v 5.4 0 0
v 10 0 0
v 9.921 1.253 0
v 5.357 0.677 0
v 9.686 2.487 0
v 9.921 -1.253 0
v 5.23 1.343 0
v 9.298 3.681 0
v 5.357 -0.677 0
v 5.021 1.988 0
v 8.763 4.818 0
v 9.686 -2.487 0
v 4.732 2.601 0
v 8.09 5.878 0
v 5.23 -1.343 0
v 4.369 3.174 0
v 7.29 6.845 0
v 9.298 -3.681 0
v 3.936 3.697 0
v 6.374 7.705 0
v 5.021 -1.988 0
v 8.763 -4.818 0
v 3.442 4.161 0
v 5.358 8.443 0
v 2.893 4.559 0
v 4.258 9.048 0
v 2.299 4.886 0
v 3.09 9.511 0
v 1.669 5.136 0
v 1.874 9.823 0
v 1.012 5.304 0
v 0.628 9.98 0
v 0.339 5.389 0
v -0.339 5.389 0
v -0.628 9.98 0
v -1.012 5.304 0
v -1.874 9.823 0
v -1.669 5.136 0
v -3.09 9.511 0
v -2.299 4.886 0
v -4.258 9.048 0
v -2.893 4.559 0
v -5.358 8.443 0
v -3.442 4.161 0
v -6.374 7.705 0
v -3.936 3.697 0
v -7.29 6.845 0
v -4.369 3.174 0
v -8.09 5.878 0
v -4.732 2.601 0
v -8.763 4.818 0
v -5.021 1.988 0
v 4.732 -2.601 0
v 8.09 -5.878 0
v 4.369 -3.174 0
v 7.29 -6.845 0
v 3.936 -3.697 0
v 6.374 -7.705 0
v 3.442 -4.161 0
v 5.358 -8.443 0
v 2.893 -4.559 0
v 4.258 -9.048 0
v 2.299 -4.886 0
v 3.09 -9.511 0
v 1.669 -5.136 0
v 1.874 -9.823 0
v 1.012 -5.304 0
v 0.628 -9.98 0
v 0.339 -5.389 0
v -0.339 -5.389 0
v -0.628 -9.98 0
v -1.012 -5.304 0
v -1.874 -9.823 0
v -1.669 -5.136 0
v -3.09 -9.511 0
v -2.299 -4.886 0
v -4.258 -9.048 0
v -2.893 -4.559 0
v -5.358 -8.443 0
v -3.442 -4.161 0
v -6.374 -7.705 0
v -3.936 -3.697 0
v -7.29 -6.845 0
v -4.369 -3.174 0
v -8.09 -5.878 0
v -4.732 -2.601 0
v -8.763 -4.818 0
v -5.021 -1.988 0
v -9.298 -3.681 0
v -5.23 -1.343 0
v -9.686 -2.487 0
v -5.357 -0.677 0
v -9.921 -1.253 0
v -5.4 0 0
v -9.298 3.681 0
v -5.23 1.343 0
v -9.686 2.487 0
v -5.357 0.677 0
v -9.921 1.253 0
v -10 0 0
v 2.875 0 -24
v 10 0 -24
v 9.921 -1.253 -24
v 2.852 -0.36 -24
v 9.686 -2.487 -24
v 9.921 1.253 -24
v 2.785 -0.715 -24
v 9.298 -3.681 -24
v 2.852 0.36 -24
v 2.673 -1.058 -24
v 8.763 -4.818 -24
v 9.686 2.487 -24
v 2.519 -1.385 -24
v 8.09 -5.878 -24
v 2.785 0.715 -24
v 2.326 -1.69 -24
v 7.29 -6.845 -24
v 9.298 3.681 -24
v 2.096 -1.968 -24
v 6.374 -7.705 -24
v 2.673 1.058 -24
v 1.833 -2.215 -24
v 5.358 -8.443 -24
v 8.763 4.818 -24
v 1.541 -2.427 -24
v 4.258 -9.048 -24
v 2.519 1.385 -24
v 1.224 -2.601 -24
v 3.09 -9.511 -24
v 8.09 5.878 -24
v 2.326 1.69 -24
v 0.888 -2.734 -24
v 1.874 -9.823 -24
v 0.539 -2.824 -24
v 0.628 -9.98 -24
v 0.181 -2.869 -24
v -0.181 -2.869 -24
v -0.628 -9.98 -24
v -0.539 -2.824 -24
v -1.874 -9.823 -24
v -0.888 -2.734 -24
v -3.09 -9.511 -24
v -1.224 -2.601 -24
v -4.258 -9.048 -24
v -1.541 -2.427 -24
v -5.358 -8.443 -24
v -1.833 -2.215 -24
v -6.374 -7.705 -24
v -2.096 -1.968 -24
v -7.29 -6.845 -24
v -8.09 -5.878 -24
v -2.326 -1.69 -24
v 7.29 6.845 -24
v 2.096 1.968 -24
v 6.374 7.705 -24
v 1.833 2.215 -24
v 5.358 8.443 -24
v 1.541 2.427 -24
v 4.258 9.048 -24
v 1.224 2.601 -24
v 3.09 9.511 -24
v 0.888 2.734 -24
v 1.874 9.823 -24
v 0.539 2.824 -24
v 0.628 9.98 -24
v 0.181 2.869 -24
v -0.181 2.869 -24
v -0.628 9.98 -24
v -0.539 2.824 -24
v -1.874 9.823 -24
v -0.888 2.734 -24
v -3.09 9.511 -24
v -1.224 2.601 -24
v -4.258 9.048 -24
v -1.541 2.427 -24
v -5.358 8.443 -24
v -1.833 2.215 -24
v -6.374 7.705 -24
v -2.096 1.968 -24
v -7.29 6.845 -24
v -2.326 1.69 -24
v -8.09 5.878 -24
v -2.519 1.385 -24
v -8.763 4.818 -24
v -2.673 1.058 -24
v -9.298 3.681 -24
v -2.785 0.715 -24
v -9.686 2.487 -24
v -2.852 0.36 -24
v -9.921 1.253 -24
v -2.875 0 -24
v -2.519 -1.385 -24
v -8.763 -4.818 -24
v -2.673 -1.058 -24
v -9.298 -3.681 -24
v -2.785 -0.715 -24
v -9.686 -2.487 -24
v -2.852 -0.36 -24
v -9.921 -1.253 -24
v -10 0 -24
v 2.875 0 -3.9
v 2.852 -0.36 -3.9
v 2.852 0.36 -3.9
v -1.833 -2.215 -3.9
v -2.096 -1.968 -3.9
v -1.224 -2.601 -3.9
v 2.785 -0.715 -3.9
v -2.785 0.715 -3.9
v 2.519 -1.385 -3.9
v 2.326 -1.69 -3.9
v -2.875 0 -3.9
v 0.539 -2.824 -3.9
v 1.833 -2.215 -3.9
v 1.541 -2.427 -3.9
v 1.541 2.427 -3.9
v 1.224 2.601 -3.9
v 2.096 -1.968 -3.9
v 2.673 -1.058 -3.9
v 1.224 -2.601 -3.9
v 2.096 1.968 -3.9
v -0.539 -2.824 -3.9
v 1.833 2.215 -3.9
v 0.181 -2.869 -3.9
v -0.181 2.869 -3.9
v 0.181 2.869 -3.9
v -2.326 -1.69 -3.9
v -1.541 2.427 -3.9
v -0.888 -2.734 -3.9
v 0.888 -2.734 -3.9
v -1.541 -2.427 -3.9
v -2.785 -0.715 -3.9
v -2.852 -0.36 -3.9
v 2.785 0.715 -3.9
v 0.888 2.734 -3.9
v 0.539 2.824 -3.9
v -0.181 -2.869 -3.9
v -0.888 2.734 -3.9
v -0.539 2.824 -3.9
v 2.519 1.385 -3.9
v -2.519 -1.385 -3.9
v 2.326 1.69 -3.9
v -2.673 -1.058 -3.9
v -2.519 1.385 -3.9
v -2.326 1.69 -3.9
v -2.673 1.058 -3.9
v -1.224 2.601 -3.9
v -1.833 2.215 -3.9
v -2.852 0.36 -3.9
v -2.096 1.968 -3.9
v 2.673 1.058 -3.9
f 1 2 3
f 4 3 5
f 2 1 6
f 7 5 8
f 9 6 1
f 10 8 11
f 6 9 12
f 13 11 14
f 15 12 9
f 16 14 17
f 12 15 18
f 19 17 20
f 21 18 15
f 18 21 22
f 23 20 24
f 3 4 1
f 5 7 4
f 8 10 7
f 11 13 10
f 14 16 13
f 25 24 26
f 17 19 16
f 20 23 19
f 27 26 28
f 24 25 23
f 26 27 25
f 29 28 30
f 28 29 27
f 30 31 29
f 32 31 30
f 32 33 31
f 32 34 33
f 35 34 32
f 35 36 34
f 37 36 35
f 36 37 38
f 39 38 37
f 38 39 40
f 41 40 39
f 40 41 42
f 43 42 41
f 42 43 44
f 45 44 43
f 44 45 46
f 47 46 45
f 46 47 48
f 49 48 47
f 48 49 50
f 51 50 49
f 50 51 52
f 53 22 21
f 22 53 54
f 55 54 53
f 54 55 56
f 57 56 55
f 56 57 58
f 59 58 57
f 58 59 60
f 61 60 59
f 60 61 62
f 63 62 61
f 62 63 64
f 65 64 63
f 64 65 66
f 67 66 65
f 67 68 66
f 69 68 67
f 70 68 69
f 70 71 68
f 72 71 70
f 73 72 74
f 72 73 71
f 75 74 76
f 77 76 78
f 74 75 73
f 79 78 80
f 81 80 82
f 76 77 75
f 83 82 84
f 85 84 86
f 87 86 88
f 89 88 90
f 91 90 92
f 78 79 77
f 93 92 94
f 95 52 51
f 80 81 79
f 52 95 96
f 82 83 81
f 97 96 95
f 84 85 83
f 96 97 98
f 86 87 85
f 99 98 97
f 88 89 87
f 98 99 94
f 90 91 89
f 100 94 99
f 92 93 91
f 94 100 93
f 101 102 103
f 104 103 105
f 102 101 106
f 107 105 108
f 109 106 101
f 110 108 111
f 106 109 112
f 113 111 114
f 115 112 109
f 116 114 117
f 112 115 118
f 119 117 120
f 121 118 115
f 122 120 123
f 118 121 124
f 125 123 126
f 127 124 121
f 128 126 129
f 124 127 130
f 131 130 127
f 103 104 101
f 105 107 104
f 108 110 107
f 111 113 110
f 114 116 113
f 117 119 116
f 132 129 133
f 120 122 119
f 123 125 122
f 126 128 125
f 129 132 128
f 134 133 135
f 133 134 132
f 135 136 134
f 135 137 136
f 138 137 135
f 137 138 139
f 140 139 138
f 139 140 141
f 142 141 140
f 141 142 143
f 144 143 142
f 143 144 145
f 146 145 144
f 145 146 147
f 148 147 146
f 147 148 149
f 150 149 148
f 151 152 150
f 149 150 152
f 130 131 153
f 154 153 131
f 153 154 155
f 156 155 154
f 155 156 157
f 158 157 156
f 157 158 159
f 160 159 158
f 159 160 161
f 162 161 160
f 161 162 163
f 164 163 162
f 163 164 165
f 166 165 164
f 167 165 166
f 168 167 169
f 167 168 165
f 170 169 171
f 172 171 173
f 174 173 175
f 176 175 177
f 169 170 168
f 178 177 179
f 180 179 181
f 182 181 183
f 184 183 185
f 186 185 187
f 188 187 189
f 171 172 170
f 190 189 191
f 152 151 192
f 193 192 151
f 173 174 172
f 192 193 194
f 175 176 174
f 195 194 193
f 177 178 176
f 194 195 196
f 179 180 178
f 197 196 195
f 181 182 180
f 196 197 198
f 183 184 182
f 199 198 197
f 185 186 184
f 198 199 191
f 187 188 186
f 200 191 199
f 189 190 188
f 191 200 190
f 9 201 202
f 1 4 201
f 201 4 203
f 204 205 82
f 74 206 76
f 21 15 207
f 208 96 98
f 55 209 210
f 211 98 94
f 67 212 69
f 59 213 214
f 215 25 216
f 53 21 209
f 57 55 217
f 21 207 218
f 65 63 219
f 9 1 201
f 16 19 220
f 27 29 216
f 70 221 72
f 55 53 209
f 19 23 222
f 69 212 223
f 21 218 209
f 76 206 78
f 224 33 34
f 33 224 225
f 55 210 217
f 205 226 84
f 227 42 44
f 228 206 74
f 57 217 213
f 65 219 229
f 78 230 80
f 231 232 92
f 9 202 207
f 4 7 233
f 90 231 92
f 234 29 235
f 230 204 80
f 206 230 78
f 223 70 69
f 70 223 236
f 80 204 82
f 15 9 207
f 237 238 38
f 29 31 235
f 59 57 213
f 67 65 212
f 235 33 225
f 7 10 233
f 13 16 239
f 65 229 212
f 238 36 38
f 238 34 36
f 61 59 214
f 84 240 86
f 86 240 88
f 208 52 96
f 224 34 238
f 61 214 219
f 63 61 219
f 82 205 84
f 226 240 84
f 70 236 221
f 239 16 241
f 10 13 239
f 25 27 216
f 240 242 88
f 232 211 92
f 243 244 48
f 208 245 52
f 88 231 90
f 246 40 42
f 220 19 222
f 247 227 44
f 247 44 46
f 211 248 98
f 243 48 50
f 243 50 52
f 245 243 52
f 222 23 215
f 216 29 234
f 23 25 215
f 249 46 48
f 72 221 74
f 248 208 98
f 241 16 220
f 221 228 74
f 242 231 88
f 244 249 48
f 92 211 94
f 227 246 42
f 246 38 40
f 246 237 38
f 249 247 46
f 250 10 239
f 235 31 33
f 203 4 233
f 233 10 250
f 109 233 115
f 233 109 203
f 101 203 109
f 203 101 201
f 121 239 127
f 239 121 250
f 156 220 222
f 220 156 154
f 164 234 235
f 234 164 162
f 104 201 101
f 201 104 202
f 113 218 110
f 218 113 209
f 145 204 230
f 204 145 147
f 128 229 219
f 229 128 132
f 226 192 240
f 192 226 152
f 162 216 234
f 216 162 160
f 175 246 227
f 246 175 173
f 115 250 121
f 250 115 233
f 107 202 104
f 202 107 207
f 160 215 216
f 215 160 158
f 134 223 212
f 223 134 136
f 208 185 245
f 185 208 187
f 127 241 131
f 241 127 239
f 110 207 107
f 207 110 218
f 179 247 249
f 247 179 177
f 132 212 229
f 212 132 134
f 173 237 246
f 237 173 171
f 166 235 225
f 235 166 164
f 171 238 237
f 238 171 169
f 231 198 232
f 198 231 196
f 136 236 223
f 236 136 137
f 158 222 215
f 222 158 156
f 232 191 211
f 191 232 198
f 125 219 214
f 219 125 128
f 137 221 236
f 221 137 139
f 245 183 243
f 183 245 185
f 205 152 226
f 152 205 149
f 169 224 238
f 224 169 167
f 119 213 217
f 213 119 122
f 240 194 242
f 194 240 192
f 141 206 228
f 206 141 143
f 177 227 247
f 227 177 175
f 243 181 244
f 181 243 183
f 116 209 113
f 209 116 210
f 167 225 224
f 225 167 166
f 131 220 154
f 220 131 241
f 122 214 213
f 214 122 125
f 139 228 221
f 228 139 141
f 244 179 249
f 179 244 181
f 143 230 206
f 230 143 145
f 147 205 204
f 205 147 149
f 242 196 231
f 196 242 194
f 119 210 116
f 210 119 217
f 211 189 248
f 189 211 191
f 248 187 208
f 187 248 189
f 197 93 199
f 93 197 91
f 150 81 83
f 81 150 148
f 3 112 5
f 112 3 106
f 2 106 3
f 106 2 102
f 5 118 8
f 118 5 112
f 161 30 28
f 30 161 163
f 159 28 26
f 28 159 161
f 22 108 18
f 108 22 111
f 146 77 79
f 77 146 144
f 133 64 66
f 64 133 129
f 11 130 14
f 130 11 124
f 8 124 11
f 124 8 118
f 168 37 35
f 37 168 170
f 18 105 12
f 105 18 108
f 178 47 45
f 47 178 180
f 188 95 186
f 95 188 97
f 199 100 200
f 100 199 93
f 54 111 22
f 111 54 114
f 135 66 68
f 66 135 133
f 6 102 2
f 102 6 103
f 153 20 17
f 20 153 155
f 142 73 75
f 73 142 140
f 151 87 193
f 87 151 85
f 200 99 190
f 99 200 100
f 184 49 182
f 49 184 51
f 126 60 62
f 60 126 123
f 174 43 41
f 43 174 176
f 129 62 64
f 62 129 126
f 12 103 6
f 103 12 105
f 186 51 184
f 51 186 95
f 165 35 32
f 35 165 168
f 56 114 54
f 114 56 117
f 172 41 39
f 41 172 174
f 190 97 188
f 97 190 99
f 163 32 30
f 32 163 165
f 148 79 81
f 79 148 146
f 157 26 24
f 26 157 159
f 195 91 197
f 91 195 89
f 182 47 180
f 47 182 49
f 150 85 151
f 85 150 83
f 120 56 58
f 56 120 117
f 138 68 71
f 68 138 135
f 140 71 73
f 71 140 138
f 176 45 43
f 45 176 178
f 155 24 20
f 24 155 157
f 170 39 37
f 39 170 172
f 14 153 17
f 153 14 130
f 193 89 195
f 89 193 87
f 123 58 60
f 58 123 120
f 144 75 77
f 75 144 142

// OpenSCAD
$fn = 50;


difference() {
	union() {
		translate(v = [0, 0, -24.0000000000]) {
			cylinder(h = 24, r = 10.0000000000);
		}
	}
	union() {
		translate(v = [0, 0, 0]) {
			rotate(a = [0, 0, 0]) {
				difference() {
					union() {
						#translate(v = [0, 0, -24.0000000000]) {
							cylinder(h = 24, r = 2.6000000000);
						}
						#translate(v = [0, 0, -3.9000000000]) {
							cylinder(h = 3.9000000000, r1 = 2.8750000000, r2 = 5.4000000000);
						}
						#translate(v = [0, 0, -24.0000000000]) {
							cylinder(h = 24, r = 2.8750000000);
						}
						#translate(v = [0, 0, -24.0000000000]) {
							cylinder(h = 24, r = 2.6000000000);
						}
					}
					union();
				}
			}
		}
	}
}
